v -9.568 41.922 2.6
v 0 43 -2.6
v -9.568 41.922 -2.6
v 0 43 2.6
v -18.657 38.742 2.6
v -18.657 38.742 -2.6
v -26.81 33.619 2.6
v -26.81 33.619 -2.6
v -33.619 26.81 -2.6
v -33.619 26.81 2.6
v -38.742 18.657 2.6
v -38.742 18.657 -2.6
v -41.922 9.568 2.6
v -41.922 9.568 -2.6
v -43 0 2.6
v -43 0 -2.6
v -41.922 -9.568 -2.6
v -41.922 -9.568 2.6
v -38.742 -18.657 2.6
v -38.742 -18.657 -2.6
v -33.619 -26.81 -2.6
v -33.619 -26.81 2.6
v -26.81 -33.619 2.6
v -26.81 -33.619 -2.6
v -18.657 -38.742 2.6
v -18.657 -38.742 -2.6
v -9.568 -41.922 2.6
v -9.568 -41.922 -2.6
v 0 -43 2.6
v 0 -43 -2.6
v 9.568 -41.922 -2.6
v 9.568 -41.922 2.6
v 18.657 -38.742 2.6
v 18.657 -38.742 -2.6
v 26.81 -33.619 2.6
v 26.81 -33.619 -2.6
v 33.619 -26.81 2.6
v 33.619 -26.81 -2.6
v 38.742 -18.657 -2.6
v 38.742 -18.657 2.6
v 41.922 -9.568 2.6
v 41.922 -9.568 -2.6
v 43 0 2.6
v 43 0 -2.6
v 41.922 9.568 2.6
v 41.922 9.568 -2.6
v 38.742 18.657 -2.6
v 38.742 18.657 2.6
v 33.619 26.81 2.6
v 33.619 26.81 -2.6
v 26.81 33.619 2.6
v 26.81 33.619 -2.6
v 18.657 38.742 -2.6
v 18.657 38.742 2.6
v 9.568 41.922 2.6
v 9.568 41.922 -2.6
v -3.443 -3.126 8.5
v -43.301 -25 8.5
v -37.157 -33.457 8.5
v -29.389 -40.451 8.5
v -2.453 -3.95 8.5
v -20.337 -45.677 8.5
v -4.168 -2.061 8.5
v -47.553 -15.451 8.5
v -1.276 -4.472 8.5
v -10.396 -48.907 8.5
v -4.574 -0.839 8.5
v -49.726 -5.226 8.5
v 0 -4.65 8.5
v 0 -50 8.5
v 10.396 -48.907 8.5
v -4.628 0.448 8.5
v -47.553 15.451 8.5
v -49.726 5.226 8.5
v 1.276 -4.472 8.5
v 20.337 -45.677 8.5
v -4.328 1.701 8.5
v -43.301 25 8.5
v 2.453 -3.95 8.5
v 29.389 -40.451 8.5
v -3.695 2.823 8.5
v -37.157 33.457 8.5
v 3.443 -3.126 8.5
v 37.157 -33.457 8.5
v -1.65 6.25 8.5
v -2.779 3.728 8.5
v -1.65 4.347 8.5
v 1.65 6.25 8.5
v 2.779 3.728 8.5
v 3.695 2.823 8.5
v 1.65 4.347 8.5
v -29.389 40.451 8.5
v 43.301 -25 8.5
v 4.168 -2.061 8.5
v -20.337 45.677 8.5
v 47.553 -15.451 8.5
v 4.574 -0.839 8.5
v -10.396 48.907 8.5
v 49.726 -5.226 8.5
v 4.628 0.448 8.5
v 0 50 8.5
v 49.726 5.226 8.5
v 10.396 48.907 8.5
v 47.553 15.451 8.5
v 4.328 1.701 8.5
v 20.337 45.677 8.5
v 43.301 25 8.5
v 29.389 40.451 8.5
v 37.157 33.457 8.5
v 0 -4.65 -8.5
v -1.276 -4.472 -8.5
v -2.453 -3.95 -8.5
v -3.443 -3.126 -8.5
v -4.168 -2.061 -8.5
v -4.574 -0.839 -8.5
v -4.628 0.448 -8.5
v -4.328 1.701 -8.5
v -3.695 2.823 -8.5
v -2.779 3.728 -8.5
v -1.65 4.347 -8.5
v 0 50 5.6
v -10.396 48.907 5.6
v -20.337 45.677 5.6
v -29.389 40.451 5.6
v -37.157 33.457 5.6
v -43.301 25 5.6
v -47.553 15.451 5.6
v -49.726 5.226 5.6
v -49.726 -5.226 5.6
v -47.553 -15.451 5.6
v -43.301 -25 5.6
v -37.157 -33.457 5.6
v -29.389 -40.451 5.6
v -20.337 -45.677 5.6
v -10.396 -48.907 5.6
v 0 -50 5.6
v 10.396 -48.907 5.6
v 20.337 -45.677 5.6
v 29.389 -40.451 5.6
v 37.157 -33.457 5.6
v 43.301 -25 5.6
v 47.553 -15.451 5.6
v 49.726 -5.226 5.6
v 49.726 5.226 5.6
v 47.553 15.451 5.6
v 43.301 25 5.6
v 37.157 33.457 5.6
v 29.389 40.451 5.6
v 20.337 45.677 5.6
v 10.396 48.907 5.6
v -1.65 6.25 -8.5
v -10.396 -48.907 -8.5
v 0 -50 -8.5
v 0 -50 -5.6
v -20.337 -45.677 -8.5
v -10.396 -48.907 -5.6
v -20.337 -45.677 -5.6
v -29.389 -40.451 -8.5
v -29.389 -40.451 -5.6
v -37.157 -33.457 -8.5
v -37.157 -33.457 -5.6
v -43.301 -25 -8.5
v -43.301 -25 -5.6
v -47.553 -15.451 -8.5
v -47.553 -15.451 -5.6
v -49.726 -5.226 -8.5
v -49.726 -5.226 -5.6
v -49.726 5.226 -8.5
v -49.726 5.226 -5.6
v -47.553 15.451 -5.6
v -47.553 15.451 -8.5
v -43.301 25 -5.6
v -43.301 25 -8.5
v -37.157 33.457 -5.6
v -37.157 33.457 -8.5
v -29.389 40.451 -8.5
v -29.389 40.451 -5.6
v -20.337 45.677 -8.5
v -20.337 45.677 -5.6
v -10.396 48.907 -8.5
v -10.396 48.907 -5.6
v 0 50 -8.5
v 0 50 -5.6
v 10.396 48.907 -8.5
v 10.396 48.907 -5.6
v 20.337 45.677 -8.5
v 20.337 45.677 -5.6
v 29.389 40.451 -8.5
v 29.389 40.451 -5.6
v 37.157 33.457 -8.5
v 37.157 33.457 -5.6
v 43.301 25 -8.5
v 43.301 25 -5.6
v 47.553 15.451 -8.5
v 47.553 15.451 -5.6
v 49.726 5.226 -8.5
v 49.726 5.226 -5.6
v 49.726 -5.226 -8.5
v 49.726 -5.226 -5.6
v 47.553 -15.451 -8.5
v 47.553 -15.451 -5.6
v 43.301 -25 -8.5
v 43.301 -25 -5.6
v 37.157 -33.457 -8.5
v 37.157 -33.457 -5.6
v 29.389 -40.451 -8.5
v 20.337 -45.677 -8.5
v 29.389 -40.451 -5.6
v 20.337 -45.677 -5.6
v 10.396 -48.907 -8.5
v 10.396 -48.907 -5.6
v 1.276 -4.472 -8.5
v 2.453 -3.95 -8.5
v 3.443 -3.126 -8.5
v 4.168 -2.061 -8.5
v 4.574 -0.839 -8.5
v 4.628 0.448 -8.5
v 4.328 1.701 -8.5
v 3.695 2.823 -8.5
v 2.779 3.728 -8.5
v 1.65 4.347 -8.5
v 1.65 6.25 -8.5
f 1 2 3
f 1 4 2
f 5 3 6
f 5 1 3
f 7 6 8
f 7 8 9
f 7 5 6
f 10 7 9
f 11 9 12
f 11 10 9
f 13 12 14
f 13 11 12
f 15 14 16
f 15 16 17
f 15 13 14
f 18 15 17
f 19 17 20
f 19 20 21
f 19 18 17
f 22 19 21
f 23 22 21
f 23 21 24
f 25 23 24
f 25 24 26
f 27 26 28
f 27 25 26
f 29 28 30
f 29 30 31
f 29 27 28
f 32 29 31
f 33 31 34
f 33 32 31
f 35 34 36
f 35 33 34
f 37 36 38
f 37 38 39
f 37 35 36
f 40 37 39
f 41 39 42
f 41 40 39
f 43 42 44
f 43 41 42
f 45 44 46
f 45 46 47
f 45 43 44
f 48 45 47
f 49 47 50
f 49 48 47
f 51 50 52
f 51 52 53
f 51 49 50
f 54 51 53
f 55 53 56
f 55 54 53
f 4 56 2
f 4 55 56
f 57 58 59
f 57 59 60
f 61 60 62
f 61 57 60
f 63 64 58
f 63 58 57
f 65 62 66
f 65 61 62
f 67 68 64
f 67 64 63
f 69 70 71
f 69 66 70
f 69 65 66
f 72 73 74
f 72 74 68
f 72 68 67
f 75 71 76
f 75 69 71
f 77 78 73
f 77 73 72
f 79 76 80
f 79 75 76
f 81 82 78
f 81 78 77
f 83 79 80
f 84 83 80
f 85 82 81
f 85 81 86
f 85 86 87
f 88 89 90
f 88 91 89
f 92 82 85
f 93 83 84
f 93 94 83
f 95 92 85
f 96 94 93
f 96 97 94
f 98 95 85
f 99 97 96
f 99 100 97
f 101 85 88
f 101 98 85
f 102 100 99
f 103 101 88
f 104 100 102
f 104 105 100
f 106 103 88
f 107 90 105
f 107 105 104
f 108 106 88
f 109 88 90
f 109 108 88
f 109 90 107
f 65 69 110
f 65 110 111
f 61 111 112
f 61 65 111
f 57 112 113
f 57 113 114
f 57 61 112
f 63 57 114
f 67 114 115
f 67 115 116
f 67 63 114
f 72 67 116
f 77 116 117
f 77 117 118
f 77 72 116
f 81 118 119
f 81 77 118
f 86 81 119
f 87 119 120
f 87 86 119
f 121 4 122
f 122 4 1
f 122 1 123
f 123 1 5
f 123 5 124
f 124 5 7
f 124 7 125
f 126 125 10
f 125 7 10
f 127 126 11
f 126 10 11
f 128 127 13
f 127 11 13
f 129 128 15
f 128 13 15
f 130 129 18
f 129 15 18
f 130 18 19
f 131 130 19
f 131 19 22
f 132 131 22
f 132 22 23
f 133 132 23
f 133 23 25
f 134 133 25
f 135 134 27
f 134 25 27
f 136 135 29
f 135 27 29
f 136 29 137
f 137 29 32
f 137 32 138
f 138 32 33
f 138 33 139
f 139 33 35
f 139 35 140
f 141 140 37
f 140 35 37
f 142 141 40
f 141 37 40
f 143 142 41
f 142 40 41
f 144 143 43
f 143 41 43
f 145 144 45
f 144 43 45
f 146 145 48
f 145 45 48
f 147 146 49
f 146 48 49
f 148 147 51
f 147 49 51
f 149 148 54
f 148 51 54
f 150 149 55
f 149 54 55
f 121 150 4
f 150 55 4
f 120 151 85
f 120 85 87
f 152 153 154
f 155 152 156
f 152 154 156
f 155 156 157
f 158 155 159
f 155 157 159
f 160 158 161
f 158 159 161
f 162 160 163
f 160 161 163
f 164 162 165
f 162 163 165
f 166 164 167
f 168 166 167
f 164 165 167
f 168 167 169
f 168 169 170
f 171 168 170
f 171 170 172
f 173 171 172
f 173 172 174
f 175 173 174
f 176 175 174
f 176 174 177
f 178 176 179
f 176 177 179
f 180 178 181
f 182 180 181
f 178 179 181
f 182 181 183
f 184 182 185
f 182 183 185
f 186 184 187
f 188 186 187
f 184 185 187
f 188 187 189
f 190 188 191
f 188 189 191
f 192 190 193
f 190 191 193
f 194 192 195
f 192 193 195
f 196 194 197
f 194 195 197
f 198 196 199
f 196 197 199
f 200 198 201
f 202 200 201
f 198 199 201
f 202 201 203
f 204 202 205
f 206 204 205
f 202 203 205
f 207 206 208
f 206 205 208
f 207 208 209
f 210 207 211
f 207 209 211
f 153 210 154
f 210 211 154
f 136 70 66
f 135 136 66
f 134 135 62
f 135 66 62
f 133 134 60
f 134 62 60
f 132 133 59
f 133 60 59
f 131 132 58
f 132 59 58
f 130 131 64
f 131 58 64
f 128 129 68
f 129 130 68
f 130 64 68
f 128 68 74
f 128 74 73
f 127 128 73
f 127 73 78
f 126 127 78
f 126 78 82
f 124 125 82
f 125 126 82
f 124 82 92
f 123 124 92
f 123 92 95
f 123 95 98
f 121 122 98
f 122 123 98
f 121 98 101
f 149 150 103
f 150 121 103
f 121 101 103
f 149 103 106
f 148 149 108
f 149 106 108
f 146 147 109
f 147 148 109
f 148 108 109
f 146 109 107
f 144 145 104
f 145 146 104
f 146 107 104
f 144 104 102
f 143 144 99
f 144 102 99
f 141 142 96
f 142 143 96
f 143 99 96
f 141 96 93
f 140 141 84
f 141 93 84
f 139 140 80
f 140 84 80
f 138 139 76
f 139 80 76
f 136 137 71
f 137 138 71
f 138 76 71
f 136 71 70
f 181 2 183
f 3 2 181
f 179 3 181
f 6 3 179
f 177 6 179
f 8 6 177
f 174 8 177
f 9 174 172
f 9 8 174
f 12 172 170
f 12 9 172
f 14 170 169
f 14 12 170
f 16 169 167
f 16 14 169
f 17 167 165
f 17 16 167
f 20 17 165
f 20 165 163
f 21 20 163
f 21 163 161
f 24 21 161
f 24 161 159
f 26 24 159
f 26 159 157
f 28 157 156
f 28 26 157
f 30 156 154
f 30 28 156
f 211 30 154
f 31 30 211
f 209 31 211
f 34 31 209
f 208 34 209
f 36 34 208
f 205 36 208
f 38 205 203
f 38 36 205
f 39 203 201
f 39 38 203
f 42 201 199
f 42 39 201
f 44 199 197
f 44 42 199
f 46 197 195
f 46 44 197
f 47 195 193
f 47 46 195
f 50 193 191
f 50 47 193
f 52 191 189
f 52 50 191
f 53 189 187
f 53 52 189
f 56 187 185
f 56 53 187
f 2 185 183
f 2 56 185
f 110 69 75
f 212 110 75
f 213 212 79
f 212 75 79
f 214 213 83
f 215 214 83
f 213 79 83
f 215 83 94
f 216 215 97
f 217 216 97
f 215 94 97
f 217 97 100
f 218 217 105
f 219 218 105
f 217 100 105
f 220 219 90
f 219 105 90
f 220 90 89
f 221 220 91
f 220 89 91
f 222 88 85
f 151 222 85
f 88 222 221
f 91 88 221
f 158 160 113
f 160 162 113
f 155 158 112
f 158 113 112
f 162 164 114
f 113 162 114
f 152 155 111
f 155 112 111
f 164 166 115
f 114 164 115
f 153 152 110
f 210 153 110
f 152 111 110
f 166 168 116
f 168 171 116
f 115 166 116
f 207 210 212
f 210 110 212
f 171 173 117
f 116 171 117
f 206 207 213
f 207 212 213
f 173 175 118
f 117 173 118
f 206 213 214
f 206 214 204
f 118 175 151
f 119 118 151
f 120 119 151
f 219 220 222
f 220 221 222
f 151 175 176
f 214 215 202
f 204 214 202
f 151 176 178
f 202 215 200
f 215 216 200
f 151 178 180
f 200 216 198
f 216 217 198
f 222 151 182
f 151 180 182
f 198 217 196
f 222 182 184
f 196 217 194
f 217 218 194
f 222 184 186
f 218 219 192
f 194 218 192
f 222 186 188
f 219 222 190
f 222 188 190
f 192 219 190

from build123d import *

# Parameters (mm, degrees)
PAD_DEPTH = 8.5


with BuildPart() as part:
    # Sketch → Pad (new body, symmetric)
    with BuildSketch(Plane.XY):
        with BuildLine():
            ThreePointArc((0, -4.65), (4.573728, -0.838758), (1.65, 4.347413))
            Line((1.65, 6.25), (1.65, 4.347413))
            Line((0, 6.25), (1.65, 6.25))
            Line((0, 50), (0, 6.25))
            ThreePointArc((0, -50), (50, 0), (0, 50))
            Line((0, -4.65), (0, -50))
        make_face()
    pad = extrude(amount=PAD_DEPTH, both=True)

    # Mirrored: Pad across Sketch V_Axis
    add(pad.mirror(Plane(origin=(0, 0, 0), x_dir=(0, 0, 1), z_dir=(1, 0, 0))))

    # Sketch001 → Groove (revolve, cut)
    with BuildSketch(Plane.YZ):
        Polygon((50, 0), (50, 5.6), (43, 2.6), (43, 0), align=None)
    groove = revolve(axis=Axis((0, 0, 0), (0, 0, 1)), mode=Mode.SUBTRACT)

    # Mirrored001: Groove across Sketch001 H_Axis
    add(groove.mirror(Plane.XY), mode=Mode.SUBTRACT)


solid = part.part
